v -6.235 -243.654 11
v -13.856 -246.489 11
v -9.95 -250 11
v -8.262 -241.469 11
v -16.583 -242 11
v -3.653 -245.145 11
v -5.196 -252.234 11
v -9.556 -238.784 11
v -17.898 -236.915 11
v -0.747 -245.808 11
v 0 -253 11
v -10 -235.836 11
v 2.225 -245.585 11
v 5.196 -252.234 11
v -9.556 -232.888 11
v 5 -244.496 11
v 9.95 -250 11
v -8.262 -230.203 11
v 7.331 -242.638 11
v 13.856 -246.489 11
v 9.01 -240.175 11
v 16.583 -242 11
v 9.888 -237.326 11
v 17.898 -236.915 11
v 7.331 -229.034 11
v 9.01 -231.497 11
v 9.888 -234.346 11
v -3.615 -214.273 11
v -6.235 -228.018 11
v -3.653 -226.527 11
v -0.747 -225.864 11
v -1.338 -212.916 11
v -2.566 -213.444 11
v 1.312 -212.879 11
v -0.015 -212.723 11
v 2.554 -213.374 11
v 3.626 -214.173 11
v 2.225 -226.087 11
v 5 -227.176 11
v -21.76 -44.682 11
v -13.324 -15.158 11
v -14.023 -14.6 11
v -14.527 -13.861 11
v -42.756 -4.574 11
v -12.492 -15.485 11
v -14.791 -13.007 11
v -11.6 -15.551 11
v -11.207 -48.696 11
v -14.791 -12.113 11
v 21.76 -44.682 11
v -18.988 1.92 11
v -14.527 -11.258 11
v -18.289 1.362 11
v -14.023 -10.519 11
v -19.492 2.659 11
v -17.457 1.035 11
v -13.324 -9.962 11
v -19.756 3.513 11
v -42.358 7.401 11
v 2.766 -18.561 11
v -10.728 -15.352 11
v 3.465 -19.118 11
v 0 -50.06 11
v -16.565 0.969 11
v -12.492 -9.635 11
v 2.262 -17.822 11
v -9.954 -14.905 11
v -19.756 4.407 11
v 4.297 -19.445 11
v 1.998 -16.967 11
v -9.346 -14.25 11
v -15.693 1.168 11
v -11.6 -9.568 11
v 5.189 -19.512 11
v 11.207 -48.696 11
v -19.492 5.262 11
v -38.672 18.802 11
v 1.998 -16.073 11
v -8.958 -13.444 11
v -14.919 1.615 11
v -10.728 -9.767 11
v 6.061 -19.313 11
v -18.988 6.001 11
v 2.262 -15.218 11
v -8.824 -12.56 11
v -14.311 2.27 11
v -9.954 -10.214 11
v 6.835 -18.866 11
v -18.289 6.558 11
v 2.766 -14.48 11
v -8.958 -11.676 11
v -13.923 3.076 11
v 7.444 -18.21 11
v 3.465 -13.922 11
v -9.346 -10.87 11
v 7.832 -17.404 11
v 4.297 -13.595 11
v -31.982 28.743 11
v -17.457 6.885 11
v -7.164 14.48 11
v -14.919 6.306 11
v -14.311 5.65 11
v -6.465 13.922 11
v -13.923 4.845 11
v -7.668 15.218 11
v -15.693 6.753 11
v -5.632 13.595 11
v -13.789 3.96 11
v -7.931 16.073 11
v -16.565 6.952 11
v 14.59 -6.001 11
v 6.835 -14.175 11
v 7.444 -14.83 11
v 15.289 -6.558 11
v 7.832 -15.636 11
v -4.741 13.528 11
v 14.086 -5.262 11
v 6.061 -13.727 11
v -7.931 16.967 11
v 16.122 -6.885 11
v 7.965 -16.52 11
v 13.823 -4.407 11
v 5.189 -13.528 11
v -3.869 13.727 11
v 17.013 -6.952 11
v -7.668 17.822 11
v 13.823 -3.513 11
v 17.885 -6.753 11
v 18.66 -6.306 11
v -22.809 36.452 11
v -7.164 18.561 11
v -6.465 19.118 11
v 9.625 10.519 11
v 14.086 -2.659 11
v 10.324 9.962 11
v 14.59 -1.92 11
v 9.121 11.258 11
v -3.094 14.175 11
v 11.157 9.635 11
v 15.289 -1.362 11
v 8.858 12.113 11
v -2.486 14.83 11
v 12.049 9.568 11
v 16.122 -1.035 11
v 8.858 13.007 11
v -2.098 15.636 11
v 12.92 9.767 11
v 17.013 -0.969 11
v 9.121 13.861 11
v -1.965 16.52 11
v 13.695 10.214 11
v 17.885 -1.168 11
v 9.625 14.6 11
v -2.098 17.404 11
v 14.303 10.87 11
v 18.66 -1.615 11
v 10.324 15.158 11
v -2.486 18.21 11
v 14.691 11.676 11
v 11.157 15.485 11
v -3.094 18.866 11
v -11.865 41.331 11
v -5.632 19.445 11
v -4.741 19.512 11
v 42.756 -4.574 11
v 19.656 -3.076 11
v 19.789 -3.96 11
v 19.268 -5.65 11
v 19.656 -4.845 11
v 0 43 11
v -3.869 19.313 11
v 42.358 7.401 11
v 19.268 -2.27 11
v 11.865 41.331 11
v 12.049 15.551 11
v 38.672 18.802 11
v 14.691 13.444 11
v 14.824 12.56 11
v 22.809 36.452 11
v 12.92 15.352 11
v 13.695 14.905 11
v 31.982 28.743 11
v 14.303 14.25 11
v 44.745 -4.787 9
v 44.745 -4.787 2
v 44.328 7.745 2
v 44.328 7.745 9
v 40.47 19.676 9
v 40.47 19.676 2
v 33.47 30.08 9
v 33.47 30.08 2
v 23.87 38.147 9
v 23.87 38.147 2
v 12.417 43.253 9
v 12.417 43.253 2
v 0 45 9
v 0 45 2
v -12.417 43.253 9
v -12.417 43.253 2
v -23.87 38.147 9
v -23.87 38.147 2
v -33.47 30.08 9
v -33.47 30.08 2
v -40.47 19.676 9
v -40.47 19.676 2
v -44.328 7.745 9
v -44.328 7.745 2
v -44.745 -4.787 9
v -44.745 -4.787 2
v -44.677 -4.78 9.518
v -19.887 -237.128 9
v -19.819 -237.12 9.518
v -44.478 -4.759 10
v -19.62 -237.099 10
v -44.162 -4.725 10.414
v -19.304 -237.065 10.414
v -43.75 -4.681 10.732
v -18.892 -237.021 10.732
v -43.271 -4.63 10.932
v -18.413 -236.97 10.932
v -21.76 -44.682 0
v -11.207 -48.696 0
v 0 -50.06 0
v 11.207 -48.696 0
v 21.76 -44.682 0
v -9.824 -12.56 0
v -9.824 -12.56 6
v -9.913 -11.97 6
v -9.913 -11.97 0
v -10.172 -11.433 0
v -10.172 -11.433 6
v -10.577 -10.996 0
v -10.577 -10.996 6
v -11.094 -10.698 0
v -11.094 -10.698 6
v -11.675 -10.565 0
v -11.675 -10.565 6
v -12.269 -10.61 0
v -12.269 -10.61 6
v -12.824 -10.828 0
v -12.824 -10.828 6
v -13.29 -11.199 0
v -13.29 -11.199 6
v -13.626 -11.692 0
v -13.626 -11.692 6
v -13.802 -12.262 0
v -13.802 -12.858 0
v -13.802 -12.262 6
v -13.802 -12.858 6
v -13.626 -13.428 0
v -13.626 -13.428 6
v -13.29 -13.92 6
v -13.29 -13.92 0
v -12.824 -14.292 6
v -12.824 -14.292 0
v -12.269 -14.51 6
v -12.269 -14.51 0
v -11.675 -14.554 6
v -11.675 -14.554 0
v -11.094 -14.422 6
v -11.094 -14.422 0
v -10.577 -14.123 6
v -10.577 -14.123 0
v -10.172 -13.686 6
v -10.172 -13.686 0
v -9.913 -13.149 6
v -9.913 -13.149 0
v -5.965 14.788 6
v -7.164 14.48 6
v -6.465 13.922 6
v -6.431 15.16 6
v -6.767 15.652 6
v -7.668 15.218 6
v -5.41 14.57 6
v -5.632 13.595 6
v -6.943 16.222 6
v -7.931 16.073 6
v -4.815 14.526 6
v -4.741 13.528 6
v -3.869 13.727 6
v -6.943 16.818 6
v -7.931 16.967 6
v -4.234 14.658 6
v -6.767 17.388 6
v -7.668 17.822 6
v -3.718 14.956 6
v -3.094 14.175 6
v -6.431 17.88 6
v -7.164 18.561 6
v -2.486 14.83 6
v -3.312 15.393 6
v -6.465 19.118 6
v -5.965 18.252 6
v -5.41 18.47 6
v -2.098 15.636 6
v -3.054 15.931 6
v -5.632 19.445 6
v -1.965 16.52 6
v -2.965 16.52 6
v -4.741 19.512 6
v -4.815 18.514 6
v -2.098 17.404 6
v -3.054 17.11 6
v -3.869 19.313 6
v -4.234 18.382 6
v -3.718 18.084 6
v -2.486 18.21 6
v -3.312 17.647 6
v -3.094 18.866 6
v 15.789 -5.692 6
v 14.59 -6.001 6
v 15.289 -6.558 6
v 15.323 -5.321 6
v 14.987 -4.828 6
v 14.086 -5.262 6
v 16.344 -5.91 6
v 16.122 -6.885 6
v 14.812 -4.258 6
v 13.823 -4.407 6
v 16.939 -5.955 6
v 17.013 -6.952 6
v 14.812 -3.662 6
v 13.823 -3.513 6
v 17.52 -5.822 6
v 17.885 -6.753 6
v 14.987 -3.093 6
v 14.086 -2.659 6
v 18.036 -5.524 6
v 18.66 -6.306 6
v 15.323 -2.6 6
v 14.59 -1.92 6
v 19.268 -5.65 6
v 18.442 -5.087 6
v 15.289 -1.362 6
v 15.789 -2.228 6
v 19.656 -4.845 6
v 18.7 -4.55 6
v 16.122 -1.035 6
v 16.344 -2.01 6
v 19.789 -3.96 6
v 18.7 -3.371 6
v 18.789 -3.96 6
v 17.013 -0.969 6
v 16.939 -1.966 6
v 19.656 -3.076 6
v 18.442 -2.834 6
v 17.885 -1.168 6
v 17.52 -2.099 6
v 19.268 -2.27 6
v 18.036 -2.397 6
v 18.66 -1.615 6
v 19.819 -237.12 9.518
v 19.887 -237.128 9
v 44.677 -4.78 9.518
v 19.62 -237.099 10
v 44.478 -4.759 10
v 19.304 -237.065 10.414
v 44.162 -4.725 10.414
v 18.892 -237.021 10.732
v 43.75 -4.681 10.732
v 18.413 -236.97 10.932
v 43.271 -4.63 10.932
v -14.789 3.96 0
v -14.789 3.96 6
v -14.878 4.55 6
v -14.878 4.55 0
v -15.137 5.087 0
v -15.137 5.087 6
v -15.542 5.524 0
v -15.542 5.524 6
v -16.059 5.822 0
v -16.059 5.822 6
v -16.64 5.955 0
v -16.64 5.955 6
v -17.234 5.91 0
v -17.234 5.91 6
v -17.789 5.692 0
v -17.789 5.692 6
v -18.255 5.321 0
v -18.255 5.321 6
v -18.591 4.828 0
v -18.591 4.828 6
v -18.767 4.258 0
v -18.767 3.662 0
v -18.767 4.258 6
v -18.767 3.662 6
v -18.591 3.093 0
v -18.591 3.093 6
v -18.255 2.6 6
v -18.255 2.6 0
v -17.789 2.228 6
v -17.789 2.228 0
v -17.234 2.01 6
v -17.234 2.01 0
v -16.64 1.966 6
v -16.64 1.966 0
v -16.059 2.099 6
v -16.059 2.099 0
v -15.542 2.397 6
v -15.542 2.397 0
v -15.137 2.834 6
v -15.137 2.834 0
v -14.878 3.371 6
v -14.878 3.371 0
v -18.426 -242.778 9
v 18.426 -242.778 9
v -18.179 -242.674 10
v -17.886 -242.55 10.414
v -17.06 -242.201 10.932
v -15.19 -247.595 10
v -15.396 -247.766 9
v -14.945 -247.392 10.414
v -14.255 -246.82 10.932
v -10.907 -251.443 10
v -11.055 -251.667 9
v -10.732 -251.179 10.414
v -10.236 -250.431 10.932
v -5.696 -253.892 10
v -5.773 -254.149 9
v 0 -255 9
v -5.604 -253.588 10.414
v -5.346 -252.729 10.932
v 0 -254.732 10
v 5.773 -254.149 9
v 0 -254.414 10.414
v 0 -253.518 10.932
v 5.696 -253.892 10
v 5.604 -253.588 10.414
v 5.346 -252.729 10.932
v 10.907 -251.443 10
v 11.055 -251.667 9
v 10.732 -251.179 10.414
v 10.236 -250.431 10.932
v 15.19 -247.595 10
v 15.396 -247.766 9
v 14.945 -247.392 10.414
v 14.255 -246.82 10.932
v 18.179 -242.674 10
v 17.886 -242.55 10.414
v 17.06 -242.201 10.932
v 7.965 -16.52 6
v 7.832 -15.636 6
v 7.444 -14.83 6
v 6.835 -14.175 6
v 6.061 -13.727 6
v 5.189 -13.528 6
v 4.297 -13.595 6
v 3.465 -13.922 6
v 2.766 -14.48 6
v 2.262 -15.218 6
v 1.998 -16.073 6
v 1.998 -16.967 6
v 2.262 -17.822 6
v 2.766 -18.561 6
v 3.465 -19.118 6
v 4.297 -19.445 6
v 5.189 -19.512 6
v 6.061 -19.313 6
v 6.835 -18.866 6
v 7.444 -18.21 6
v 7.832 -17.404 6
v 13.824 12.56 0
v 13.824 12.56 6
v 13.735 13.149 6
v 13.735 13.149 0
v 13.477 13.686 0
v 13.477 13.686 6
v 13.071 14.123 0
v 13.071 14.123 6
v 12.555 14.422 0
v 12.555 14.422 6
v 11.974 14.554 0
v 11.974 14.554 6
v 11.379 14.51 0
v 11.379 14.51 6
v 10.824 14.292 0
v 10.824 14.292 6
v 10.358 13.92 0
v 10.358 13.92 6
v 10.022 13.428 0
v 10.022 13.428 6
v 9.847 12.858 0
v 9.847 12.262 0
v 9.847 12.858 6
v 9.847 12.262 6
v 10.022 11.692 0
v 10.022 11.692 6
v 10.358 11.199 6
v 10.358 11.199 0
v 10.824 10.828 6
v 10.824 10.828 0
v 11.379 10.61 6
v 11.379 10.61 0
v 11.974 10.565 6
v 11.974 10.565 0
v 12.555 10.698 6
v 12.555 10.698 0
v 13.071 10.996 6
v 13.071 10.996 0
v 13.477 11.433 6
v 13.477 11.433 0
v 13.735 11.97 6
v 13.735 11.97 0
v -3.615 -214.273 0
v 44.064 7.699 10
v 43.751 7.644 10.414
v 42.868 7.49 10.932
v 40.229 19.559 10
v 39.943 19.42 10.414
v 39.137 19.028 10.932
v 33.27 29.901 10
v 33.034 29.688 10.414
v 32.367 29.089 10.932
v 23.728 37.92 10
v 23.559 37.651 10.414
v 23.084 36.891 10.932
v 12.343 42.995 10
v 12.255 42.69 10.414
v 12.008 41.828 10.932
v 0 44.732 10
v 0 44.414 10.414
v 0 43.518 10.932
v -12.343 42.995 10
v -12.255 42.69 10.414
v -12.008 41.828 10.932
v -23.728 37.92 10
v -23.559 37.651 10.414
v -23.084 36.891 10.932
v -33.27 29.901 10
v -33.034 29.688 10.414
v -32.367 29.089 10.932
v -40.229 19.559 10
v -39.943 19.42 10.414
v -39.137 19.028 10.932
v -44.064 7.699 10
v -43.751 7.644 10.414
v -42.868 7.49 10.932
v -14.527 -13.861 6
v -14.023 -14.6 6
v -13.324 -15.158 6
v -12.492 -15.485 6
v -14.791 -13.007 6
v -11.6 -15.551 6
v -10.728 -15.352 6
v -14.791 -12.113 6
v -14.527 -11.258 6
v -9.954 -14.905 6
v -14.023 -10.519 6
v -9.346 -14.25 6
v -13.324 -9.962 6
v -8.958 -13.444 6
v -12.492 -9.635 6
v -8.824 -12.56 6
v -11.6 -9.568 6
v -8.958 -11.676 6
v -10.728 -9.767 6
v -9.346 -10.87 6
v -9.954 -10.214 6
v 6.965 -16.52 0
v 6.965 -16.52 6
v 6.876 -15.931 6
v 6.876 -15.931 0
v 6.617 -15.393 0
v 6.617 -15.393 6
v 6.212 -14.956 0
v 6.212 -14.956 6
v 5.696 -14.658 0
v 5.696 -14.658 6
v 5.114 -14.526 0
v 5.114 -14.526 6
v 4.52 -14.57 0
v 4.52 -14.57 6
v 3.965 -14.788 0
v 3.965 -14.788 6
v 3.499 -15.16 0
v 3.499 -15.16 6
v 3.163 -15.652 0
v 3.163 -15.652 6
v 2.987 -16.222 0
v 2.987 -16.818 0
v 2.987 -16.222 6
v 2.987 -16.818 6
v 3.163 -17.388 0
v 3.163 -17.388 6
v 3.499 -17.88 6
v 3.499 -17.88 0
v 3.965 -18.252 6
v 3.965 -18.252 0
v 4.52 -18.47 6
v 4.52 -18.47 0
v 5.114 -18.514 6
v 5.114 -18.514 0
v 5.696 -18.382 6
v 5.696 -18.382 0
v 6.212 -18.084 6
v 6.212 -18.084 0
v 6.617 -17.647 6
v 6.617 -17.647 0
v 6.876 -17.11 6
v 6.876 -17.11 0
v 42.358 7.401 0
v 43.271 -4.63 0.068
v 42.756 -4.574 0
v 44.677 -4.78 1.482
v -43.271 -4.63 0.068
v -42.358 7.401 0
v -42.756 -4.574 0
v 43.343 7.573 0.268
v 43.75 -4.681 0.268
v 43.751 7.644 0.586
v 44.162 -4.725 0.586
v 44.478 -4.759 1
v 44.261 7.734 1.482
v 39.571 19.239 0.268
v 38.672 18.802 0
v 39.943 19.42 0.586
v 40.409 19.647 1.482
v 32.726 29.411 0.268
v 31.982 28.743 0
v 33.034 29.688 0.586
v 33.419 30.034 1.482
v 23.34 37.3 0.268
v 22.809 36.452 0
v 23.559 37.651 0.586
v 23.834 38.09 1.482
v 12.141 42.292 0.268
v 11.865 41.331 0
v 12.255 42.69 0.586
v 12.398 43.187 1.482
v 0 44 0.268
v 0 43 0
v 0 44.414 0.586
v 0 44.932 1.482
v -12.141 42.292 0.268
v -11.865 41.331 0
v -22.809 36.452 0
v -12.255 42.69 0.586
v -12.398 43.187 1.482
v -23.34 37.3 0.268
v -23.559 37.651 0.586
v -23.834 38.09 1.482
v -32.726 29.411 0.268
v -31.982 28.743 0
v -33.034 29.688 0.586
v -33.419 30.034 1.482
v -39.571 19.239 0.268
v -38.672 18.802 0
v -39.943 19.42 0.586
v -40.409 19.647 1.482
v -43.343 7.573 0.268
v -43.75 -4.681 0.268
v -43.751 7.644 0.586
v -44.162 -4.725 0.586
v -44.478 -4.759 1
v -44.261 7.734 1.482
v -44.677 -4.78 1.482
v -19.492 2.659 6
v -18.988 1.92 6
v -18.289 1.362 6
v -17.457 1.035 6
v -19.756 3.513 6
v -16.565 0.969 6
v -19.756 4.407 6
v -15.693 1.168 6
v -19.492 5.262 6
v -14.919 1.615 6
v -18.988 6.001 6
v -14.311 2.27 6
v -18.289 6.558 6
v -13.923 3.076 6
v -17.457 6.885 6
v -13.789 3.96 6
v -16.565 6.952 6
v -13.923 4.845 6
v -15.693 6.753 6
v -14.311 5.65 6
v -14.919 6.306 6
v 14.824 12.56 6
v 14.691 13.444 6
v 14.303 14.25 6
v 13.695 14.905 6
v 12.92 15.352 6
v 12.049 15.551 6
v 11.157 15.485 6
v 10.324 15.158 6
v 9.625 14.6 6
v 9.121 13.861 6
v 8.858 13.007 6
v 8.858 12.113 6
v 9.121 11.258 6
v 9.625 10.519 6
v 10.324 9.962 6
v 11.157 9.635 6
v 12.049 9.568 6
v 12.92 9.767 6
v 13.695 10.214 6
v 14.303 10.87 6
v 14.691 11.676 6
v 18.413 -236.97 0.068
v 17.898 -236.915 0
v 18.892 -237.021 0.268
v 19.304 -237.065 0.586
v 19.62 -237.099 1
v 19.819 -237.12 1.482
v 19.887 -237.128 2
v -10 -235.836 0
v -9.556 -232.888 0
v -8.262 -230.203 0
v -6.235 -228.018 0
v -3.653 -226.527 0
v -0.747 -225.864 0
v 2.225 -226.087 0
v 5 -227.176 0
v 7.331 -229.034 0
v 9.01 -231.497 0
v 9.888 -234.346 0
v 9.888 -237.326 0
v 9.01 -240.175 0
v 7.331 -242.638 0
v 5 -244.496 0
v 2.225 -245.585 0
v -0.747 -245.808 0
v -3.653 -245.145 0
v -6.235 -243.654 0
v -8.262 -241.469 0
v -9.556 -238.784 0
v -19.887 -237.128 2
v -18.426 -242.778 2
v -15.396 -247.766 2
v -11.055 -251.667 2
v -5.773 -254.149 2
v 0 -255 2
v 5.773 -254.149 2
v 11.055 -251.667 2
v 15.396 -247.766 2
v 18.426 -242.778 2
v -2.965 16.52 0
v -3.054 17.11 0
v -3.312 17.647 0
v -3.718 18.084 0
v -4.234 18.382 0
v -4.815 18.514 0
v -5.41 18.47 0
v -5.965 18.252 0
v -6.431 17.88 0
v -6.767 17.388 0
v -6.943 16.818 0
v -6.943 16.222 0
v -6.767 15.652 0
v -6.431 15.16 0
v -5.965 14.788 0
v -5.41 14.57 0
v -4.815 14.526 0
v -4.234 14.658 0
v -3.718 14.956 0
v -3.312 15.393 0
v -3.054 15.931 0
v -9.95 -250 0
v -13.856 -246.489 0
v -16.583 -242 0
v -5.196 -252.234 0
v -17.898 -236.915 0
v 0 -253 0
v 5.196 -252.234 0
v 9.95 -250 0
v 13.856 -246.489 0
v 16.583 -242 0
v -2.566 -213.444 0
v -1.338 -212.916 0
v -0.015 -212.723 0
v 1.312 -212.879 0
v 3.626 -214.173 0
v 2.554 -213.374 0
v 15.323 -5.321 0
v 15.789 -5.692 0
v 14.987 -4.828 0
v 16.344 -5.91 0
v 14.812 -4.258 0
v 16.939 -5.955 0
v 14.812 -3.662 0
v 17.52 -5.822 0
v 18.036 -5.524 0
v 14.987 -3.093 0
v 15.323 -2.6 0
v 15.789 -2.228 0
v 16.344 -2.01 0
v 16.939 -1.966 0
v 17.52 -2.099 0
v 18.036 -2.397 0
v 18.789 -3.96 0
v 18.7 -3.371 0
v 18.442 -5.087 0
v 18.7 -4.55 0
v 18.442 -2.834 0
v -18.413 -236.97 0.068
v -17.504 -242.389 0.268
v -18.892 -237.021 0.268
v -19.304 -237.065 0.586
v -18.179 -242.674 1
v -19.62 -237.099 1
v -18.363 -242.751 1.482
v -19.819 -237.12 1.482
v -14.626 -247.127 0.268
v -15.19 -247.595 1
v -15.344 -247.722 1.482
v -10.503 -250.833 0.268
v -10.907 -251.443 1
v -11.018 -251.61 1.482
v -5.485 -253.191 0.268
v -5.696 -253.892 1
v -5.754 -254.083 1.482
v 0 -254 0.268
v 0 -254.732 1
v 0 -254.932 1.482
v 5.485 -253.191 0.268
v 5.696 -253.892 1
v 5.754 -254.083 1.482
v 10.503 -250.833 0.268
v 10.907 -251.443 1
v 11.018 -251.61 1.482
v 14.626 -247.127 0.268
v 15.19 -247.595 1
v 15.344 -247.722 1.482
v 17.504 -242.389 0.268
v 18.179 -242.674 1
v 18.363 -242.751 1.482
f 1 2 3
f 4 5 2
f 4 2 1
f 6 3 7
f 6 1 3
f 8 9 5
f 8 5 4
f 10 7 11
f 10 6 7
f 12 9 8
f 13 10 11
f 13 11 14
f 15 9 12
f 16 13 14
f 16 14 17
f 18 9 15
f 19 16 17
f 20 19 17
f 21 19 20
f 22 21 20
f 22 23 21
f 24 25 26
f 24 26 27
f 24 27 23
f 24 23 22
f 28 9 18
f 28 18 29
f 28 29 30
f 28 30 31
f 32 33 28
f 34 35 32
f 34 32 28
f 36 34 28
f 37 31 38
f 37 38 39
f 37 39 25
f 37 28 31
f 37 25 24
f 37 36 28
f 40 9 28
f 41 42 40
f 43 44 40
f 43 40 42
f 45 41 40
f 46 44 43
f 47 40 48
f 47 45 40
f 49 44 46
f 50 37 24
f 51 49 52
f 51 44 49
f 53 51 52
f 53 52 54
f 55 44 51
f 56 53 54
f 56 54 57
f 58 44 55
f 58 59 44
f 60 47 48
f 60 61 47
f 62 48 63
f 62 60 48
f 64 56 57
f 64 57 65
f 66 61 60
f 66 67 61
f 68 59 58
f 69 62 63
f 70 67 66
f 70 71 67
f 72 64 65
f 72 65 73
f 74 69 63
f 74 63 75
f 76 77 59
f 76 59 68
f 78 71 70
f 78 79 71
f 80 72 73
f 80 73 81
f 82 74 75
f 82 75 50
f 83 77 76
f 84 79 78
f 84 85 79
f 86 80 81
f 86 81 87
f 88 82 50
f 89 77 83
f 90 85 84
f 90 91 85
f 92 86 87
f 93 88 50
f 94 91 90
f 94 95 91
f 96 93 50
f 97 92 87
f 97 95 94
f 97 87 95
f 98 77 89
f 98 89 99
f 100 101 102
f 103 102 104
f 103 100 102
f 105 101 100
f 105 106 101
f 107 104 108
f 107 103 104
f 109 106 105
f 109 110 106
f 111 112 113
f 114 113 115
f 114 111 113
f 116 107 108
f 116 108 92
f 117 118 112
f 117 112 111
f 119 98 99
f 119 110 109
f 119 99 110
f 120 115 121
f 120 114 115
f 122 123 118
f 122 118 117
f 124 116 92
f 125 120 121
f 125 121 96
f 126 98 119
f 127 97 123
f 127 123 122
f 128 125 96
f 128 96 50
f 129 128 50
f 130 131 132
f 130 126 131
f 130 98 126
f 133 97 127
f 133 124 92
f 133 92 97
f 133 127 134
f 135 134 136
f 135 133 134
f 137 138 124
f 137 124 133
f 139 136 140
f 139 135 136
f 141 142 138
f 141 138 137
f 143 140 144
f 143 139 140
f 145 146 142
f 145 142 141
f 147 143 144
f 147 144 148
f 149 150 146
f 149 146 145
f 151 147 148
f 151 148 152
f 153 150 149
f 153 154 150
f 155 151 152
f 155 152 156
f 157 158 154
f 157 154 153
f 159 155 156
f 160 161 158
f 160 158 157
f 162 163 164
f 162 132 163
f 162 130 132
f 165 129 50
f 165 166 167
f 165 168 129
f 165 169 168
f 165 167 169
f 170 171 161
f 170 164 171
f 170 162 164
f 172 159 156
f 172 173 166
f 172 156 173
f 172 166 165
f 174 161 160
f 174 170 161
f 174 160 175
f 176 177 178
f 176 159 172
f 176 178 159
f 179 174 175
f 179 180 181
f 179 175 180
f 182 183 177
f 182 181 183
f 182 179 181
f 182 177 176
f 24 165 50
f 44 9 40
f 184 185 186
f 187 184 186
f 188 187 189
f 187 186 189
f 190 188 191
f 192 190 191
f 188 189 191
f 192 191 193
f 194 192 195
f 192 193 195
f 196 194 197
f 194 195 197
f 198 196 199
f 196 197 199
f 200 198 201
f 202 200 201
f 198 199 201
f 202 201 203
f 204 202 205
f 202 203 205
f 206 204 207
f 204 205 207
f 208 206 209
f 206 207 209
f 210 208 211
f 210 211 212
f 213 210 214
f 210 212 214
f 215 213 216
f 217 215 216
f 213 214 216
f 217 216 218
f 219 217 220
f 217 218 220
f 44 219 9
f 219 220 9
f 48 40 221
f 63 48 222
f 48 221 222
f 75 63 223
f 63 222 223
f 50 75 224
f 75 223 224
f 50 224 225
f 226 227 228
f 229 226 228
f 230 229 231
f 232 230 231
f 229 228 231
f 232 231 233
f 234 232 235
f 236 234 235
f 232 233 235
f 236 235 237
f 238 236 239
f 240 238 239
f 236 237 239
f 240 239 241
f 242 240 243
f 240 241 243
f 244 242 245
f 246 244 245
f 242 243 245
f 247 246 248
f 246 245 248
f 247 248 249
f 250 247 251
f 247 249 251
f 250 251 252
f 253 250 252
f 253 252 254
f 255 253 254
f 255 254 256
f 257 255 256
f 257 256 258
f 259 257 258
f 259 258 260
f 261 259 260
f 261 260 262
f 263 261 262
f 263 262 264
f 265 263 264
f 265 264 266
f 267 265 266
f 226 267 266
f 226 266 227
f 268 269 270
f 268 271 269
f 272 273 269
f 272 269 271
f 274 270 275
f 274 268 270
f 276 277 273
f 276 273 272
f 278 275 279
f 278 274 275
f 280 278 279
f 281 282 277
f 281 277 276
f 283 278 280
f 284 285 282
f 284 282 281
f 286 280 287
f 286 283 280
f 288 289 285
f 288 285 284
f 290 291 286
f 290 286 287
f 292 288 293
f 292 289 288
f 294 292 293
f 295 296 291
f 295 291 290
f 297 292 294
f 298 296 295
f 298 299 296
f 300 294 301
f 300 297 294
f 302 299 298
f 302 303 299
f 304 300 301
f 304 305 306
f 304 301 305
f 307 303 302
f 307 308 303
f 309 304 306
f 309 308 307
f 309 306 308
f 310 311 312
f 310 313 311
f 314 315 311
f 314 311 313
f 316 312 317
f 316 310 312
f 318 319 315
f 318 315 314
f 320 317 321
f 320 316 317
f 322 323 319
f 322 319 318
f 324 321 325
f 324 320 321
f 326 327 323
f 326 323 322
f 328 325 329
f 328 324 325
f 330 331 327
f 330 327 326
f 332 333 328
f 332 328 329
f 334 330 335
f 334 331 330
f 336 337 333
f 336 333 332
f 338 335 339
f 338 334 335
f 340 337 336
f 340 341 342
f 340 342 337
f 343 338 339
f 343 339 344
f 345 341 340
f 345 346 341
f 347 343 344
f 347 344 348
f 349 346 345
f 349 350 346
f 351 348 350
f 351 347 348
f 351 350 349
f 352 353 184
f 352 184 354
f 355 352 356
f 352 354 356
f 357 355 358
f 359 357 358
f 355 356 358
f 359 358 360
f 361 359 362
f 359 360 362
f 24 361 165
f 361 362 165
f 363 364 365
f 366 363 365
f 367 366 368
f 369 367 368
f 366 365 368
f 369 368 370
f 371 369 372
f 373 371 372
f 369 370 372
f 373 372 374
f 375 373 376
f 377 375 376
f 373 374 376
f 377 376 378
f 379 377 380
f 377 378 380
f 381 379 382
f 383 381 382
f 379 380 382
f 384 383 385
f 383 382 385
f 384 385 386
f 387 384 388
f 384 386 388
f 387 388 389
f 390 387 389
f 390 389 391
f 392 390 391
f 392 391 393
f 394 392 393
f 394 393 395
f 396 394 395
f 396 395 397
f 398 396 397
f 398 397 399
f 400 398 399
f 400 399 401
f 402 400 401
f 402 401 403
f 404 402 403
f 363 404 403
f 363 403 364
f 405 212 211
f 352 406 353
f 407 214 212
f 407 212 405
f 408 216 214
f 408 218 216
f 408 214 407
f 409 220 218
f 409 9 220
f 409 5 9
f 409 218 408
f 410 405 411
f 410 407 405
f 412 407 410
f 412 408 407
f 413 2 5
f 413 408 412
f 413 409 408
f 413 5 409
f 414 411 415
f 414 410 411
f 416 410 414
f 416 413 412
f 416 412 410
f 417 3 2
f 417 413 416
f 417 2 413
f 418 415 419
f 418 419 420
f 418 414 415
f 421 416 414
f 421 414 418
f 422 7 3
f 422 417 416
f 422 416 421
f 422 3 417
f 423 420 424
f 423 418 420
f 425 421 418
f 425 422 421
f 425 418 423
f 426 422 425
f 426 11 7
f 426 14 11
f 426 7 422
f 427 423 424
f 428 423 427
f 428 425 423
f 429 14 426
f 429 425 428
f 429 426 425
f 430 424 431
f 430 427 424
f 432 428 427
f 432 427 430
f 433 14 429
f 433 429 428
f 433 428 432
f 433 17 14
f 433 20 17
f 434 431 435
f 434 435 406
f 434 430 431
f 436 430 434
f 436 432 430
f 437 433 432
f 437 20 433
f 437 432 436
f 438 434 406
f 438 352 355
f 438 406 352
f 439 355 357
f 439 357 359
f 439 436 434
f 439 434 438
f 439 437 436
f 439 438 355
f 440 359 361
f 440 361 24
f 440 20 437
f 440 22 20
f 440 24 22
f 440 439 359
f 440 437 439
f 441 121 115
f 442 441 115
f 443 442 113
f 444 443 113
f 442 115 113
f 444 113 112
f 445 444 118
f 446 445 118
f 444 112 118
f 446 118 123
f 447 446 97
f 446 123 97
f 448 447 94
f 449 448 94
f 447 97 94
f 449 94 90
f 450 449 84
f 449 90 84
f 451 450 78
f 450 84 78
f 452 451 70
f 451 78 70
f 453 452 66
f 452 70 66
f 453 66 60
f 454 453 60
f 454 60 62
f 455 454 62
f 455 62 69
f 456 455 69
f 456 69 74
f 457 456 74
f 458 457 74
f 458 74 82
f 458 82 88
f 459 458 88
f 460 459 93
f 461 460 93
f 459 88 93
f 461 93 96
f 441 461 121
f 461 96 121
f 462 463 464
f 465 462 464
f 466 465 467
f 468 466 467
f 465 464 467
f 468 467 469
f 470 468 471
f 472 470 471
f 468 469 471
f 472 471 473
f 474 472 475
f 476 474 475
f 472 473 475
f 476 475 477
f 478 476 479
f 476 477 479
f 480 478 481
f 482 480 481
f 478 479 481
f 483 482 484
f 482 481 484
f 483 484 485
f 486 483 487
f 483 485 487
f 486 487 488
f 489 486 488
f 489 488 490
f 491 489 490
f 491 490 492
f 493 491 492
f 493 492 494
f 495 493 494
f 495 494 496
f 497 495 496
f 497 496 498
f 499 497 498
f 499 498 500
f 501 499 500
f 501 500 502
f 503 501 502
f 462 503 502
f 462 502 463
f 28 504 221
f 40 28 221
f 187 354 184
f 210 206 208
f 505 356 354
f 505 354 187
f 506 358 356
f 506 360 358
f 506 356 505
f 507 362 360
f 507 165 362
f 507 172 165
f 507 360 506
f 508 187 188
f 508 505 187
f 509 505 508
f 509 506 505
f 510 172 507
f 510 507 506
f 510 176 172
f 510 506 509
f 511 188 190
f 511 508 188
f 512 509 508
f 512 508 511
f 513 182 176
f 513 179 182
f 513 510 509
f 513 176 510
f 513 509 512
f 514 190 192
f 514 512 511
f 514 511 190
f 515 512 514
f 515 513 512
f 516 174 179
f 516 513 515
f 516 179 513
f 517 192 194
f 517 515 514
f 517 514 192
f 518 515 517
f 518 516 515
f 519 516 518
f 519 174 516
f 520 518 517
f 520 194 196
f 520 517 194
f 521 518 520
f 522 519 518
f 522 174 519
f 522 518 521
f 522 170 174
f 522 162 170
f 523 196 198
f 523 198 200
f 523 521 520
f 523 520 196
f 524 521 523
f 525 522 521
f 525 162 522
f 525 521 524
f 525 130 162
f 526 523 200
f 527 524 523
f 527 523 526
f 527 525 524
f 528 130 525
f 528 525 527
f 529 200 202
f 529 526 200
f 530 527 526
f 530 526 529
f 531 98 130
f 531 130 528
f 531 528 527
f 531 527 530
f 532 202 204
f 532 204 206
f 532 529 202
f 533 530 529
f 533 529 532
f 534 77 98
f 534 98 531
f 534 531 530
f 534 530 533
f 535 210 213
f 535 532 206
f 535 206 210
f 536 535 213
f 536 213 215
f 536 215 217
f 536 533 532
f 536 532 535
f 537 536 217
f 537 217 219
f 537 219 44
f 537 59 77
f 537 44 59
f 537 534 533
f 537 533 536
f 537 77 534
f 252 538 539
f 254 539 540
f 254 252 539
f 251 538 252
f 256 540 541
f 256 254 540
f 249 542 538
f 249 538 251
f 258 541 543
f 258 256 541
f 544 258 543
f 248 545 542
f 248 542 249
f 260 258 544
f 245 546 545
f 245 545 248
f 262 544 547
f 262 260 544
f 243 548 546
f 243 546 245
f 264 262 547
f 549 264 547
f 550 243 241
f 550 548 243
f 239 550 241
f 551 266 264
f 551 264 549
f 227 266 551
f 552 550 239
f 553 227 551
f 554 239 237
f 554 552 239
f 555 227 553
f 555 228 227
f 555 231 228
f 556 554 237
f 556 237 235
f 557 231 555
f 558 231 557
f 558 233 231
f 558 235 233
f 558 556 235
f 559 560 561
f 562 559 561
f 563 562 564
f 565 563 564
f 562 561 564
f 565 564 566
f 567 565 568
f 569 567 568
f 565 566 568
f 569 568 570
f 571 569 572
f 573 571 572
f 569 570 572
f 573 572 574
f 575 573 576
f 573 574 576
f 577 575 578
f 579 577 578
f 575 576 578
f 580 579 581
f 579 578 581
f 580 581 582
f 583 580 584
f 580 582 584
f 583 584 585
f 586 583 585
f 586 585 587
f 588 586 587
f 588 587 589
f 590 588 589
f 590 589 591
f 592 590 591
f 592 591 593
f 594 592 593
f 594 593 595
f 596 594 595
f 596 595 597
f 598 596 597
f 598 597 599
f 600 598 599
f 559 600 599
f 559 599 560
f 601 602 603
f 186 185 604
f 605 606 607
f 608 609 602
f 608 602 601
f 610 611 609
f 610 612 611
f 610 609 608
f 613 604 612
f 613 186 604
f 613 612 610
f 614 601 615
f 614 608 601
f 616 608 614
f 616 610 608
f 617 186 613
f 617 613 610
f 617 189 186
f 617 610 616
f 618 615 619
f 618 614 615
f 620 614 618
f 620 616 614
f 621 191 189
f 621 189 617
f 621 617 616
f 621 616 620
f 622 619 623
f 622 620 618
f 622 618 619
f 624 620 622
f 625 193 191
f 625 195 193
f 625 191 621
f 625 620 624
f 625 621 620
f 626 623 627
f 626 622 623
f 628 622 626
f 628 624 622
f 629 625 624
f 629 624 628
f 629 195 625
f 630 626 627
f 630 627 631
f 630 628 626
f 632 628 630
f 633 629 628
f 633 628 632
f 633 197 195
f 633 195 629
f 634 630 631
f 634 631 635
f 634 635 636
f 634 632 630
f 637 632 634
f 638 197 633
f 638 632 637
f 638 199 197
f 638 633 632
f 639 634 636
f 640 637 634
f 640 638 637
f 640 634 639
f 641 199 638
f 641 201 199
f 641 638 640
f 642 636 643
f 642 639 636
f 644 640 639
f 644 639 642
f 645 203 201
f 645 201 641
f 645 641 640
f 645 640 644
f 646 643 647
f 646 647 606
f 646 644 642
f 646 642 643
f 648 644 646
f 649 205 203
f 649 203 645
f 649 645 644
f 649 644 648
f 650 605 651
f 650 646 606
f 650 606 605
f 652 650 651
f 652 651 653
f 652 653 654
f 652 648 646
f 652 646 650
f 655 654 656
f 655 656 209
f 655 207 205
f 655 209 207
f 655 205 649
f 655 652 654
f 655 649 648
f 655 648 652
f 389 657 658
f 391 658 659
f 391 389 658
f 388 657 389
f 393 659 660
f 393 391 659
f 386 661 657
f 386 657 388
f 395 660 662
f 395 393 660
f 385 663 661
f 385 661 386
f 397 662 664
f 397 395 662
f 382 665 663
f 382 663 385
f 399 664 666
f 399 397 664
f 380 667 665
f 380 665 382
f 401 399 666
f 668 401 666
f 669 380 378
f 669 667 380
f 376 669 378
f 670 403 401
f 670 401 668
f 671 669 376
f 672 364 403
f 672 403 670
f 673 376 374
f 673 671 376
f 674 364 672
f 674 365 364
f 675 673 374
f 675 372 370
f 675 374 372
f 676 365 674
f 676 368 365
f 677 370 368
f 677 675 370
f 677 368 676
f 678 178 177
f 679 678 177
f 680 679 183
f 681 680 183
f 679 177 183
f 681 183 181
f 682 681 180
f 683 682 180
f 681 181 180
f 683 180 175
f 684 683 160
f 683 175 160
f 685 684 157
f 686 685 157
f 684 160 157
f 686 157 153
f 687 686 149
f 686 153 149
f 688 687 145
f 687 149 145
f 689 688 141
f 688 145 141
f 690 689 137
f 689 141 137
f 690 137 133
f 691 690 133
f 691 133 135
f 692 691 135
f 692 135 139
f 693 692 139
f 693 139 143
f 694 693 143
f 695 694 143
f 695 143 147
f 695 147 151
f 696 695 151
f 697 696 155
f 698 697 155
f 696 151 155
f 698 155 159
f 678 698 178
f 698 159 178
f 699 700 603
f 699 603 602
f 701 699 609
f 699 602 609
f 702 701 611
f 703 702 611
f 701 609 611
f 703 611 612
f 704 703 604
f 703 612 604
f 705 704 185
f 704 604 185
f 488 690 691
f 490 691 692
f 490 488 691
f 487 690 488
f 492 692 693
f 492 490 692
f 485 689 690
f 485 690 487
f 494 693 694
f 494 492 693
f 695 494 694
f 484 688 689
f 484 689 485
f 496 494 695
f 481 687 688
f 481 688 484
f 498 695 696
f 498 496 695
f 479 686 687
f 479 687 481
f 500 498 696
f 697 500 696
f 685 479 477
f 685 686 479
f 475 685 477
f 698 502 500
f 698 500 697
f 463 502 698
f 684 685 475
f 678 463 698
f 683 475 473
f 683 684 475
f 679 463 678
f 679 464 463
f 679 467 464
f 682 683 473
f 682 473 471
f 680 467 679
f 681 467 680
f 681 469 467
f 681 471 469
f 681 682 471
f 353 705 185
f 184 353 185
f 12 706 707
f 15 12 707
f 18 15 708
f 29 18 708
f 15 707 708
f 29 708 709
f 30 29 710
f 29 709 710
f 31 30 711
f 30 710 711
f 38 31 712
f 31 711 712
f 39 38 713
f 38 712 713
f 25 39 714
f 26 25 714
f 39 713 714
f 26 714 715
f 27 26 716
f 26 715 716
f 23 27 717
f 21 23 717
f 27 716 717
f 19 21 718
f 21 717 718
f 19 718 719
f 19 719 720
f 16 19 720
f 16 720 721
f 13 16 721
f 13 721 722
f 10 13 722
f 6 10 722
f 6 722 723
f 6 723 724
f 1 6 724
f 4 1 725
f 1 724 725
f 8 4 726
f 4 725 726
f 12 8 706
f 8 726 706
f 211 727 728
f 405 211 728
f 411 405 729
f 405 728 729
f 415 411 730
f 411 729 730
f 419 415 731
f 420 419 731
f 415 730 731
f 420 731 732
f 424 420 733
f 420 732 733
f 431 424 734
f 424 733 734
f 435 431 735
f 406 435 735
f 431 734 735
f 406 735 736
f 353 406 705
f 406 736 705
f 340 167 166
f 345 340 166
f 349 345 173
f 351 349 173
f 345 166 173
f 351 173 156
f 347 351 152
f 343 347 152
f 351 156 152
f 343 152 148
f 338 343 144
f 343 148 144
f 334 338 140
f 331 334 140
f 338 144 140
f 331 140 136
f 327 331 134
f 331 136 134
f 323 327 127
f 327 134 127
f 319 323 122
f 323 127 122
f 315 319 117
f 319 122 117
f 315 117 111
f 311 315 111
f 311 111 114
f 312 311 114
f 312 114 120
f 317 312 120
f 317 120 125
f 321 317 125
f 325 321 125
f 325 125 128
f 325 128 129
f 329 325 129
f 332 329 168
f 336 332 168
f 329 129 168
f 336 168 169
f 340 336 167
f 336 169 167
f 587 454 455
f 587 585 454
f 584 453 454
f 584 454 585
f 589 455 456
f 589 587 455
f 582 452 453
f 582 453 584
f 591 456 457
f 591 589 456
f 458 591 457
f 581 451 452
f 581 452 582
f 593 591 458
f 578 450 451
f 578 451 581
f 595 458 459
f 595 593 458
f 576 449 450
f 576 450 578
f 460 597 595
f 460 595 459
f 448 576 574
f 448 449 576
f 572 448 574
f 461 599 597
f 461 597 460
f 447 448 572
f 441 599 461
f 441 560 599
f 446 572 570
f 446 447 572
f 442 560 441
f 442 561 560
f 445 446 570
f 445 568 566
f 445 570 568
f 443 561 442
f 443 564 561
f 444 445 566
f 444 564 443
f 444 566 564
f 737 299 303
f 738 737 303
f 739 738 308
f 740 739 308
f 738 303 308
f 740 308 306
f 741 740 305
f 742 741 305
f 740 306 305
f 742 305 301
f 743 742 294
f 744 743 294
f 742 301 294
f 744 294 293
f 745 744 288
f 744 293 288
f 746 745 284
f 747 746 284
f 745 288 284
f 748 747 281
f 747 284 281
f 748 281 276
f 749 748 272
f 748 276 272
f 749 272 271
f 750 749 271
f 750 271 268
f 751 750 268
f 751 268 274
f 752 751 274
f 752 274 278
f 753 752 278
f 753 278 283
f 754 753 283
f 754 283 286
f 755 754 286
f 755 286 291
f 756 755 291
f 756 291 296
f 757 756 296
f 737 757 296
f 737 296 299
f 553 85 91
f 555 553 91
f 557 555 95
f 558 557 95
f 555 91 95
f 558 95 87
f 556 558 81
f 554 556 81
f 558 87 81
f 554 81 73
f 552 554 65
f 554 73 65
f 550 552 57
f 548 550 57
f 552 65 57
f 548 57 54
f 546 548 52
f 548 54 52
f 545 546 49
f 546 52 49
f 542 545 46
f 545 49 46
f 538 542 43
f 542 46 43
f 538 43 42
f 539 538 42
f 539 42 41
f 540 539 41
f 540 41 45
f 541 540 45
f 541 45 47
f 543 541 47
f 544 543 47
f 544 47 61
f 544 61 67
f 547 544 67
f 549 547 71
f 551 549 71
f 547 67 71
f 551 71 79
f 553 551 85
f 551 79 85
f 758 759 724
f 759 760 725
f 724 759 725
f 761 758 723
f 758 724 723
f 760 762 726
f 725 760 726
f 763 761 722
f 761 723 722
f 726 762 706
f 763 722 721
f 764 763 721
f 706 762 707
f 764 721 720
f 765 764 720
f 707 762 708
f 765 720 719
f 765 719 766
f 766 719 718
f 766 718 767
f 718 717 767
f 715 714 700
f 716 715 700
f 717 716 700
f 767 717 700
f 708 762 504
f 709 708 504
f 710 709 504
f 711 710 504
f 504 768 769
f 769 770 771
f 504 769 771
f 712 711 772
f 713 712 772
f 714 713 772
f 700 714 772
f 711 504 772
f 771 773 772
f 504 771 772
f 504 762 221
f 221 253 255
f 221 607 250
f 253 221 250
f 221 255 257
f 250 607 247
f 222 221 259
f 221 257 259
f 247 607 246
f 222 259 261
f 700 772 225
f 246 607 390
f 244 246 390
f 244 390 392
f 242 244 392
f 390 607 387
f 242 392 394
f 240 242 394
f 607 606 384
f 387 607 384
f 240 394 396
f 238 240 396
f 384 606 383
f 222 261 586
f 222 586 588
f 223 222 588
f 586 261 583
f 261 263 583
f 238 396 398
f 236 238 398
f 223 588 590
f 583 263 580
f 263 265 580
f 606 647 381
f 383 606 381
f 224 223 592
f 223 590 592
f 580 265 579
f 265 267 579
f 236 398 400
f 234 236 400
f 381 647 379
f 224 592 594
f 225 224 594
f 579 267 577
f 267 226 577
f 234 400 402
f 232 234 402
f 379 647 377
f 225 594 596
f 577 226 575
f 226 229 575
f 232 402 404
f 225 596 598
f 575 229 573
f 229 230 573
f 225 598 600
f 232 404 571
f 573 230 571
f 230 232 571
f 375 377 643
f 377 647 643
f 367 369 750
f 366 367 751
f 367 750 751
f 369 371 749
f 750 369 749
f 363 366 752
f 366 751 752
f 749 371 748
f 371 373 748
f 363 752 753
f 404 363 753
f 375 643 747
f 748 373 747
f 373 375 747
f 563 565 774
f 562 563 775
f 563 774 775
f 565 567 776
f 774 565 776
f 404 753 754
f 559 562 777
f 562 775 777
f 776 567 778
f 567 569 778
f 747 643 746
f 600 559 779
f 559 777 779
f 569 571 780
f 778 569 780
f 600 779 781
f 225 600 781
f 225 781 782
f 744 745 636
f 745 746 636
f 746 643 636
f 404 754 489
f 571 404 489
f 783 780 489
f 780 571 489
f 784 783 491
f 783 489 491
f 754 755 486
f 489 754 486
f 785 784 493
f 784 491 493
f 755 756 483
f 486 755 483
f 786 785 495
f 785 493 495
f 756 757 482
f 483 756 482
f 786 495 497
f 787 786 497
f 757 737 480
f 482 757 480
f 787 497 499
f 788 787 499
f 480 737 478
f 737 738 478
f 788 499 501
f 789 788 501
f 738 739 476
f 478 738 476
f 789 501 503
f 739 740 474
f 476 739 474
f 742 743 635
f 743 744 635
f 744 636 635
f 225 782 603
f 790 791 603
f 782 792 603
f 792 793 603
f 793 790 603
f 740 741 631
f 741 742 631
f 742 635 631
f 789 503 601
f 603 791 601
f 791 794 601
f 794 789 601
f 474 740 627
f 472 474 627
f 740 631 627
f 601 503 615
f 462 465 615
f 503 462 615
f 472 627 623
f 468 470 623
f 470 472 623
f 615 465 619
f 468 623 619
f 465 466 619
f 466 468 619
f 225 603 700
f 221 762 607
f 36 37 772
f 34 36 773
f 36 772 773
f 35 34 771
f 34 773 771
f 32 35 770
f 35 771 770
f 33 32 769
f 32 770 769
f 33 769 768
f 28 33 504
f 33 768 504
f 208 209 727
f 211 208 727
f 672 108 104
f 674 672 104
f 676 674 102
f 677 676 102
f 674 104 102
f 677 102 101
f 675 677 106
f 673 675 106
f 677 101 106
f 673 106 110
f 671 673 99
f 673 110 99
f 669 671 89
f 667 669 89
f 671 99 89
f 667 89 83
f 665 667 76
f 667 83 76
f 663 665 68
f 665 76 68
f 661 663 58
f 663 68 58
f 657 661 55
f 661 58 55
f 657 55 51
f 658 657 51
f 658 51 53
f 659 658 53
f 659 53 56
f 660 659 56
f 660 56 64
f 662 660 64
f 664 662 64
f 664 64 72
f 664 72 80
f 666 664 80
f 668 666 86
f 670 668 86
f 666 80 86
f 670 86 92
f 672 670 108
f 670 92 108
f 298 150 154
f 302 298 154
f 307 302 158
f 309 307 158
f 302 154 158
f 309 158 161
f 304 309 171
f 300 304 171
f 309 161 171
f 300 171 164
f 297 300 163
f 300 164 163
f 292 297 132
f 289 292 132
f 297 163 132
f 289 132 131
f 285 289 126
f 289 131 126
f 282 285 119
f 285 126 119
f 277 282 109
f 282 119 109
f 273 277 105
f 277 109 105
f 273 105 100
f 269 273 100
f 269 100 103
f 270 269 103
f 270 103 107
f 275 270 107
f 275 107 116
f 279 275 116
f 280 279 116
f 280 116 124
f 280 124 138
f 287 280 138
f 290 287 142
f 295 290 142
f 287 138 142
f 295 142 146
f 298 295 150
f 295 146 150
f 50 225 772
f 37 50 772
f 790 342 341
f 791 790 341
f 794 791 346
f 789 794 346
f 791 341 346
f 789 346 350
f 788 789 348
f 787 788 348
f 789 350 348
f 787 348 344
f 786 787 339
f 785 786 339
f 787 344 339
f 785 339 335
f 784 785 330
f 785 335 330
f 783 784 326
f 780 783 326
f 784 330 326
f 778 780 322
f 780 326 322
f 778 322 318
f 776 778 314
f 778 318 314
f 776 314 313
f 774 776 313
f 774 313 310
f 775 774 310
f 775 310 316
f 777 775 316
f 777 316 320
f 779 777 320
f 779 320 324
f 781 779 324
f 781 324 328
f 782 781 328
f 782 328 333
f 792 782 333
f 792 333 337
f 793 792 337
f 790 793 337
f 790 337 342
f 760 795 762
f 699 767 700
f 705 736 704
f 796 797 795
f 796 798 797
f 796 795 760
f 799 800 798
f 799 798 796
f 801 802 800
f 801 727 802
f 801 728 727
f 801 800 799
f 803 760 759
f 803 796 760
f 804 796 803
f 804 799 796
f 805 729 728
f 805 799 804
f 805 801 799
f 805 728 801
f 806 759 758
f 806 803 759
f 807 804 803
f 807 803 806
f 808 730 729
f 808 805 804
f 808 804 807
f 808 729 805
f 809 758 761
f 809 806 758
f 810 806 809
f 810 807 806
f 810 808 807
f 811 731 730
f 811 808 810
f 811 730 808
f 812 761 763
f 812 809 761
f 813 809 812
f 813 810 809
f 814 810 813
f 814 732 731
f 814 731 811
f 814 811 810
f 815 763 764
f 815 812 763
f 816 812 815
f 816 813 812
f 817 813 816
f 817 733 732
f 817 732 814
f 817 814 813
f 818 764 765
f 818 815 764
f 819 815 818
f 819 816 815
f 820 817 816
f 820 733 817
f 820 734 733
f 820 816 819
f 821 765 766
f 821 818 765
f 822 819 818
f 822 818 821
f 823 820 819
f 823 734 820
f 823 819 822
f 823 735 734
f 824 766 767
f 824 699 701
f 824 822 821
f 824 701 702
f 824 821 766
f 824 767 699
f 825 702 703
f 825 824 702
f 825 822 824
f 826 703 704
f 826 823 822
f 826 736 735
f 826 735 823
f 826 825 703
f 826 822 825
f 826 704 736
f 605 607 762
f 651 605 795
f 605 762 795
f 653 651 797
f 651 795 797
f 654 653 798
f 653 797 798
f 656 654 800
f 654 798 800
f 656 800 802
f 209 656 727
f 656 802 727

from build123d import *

# Parameters (mm, degrees)
EXTRUDE_1_DEPTH     = 11
SKETCH_2_R          = 10
CUT_EXTRUDE_1_DEPTH = 11
FILLET_1_R          = 2
CUT_EXTRUDE_2_DEPTH = 20
SKETCH_6_R          = 2
CUT_EXTRUDE_4_DEPTH = 33
SKETCH_7_R          = 3
CUT_EXTRUDE_5_DEPTH = 5


with BuildPart() as part:
    # 草图1 → 凸台-拉伸1 (new body)
    with BuildSketch(Plane.XY):
        with BuildLine():
            Line((-44.744635323, -4.787234043), (-19.886504588, -237.127659574))
            ThreePointArc((-19.886504588, -237.127659574), (0, -255), (19.886504588, -237.127659574))
            Line((19.886504588, -237.127659574), (44.744635323, -4.787234043))
            ThreePointArc((44.744635323, -4.787234043), (0, 45), (-44.744635323, -4.787234043))
        make_face()
    extrude(amount=EXTRUDE_1_DEPTH)

    # 草图2 → 切除-拉伸1 (cut)
    with BuildSketch(Plane(origin=(0, 0, 0), x_dir=(-1, 0, 0), z_dir=(0, 0, -1))):
        with Locations((0, -235.836034695)):
            Circle(SKETCH_2_R)
    extrude(amount=-CUT_EXTRUDE_1_DEPTH, mode=Mode.SUBTRACT)

    # 圆角1
    fillet_1_edges = [part.edges().sort_by_distance(p)[0] for p in [
        (0, -255, 11),
        (32.315569956, -120.957446809, 11),
        (0, 45, 11),
        (32.315569956, -120.957446809, 0),
        (0, -255, 0),
        (-32.315569956, -120.957446809, 0),
        (0, 45, 0),
        (-32.315569956, -120.957446809, 11),
    ]]
    fillet(fillet_1_edges, radius=FILLET_1_R)

    # 草图4 → 切除-拉伸2 (cut)
    with BuildSketch(Plane(origin=(0, 0, 0), x_dir=(-1, 0, 0), z_dir=(0, 0, -1))):
        with BuildLine():
            Line((-21.759824224, -44.682312886), (-3.625991278, -214.173032358))
            ThreePointArc((-3.625991278, -214.173032358), (0.015295132, -212.723088949), (3.615338262, -214.272602446))
            Line((3.615338262, -214.272602446), (21.759824224, -44.682312886))
            ThreePointArc((21.759824224, -44.682312886), (0, -50.060383894), (-21.759824224, -44.682312886))
        make_face()
    extrude(amount=-CUT_EXTRUDE_2_DEPTH, mode=Mode.SUBTRACT)

    # 草图6 → 切除-拉伸4 (cut)
    with BuildSketch(Plane.XY.offset(11)):
        with Locations((-16.789244382, 3.960274368)):
            Circle(SKETCH_6_R)
        with Locations((-4.964923982, 16.52004933)):
            Circle(SKETCH_6_R)
        with Locations((11.8243204, 12.559774961)):
            Circle(SKETCH_6_R)
        with Locations((16.789244382, -3.960274368)):
            Circle(SKETCH_6_R)
        with Locations((4.964923982, -16.52004933)):
            Circle(SKETCH_6_R)
        with Locations((-11.8243204, -12.559774961)):
            Circle(SKETCH_6_R)
    extrude(amount=-CUT_EXTRUDE_4_DEPTH, mode=Mode.SUBTRACT)

    # 草图7 → 切除-拉伸5 (cut)
    with BuildSketch(Plane.XY.offset(11)):
        with Locations((-4.964923982, 16.52004933)):
            Circle(SKETCH_7_R)
        with Locations((11.8243204, 12.559774961)):
            Circle(SKETCH_7_R)
        with Locations((16.789244382, -3.960274368)):
            Circle(SKETCH_7_R)
        with Locations((4.964923982, -16.52004933)):
            Circle(SKETCH_7_R)
        with Locations((-11.8243204, -12.559774961)):
            Circle(SKETCH_7_R)
        with Locations((-16.789244382, 3.960274368)):
            Circle(SKETCH_7_R)
    extrude(amount=-CUT_EXTRUDE_5_DEPTH, mode=Mode.SUBTRACT)


solid = part.part
